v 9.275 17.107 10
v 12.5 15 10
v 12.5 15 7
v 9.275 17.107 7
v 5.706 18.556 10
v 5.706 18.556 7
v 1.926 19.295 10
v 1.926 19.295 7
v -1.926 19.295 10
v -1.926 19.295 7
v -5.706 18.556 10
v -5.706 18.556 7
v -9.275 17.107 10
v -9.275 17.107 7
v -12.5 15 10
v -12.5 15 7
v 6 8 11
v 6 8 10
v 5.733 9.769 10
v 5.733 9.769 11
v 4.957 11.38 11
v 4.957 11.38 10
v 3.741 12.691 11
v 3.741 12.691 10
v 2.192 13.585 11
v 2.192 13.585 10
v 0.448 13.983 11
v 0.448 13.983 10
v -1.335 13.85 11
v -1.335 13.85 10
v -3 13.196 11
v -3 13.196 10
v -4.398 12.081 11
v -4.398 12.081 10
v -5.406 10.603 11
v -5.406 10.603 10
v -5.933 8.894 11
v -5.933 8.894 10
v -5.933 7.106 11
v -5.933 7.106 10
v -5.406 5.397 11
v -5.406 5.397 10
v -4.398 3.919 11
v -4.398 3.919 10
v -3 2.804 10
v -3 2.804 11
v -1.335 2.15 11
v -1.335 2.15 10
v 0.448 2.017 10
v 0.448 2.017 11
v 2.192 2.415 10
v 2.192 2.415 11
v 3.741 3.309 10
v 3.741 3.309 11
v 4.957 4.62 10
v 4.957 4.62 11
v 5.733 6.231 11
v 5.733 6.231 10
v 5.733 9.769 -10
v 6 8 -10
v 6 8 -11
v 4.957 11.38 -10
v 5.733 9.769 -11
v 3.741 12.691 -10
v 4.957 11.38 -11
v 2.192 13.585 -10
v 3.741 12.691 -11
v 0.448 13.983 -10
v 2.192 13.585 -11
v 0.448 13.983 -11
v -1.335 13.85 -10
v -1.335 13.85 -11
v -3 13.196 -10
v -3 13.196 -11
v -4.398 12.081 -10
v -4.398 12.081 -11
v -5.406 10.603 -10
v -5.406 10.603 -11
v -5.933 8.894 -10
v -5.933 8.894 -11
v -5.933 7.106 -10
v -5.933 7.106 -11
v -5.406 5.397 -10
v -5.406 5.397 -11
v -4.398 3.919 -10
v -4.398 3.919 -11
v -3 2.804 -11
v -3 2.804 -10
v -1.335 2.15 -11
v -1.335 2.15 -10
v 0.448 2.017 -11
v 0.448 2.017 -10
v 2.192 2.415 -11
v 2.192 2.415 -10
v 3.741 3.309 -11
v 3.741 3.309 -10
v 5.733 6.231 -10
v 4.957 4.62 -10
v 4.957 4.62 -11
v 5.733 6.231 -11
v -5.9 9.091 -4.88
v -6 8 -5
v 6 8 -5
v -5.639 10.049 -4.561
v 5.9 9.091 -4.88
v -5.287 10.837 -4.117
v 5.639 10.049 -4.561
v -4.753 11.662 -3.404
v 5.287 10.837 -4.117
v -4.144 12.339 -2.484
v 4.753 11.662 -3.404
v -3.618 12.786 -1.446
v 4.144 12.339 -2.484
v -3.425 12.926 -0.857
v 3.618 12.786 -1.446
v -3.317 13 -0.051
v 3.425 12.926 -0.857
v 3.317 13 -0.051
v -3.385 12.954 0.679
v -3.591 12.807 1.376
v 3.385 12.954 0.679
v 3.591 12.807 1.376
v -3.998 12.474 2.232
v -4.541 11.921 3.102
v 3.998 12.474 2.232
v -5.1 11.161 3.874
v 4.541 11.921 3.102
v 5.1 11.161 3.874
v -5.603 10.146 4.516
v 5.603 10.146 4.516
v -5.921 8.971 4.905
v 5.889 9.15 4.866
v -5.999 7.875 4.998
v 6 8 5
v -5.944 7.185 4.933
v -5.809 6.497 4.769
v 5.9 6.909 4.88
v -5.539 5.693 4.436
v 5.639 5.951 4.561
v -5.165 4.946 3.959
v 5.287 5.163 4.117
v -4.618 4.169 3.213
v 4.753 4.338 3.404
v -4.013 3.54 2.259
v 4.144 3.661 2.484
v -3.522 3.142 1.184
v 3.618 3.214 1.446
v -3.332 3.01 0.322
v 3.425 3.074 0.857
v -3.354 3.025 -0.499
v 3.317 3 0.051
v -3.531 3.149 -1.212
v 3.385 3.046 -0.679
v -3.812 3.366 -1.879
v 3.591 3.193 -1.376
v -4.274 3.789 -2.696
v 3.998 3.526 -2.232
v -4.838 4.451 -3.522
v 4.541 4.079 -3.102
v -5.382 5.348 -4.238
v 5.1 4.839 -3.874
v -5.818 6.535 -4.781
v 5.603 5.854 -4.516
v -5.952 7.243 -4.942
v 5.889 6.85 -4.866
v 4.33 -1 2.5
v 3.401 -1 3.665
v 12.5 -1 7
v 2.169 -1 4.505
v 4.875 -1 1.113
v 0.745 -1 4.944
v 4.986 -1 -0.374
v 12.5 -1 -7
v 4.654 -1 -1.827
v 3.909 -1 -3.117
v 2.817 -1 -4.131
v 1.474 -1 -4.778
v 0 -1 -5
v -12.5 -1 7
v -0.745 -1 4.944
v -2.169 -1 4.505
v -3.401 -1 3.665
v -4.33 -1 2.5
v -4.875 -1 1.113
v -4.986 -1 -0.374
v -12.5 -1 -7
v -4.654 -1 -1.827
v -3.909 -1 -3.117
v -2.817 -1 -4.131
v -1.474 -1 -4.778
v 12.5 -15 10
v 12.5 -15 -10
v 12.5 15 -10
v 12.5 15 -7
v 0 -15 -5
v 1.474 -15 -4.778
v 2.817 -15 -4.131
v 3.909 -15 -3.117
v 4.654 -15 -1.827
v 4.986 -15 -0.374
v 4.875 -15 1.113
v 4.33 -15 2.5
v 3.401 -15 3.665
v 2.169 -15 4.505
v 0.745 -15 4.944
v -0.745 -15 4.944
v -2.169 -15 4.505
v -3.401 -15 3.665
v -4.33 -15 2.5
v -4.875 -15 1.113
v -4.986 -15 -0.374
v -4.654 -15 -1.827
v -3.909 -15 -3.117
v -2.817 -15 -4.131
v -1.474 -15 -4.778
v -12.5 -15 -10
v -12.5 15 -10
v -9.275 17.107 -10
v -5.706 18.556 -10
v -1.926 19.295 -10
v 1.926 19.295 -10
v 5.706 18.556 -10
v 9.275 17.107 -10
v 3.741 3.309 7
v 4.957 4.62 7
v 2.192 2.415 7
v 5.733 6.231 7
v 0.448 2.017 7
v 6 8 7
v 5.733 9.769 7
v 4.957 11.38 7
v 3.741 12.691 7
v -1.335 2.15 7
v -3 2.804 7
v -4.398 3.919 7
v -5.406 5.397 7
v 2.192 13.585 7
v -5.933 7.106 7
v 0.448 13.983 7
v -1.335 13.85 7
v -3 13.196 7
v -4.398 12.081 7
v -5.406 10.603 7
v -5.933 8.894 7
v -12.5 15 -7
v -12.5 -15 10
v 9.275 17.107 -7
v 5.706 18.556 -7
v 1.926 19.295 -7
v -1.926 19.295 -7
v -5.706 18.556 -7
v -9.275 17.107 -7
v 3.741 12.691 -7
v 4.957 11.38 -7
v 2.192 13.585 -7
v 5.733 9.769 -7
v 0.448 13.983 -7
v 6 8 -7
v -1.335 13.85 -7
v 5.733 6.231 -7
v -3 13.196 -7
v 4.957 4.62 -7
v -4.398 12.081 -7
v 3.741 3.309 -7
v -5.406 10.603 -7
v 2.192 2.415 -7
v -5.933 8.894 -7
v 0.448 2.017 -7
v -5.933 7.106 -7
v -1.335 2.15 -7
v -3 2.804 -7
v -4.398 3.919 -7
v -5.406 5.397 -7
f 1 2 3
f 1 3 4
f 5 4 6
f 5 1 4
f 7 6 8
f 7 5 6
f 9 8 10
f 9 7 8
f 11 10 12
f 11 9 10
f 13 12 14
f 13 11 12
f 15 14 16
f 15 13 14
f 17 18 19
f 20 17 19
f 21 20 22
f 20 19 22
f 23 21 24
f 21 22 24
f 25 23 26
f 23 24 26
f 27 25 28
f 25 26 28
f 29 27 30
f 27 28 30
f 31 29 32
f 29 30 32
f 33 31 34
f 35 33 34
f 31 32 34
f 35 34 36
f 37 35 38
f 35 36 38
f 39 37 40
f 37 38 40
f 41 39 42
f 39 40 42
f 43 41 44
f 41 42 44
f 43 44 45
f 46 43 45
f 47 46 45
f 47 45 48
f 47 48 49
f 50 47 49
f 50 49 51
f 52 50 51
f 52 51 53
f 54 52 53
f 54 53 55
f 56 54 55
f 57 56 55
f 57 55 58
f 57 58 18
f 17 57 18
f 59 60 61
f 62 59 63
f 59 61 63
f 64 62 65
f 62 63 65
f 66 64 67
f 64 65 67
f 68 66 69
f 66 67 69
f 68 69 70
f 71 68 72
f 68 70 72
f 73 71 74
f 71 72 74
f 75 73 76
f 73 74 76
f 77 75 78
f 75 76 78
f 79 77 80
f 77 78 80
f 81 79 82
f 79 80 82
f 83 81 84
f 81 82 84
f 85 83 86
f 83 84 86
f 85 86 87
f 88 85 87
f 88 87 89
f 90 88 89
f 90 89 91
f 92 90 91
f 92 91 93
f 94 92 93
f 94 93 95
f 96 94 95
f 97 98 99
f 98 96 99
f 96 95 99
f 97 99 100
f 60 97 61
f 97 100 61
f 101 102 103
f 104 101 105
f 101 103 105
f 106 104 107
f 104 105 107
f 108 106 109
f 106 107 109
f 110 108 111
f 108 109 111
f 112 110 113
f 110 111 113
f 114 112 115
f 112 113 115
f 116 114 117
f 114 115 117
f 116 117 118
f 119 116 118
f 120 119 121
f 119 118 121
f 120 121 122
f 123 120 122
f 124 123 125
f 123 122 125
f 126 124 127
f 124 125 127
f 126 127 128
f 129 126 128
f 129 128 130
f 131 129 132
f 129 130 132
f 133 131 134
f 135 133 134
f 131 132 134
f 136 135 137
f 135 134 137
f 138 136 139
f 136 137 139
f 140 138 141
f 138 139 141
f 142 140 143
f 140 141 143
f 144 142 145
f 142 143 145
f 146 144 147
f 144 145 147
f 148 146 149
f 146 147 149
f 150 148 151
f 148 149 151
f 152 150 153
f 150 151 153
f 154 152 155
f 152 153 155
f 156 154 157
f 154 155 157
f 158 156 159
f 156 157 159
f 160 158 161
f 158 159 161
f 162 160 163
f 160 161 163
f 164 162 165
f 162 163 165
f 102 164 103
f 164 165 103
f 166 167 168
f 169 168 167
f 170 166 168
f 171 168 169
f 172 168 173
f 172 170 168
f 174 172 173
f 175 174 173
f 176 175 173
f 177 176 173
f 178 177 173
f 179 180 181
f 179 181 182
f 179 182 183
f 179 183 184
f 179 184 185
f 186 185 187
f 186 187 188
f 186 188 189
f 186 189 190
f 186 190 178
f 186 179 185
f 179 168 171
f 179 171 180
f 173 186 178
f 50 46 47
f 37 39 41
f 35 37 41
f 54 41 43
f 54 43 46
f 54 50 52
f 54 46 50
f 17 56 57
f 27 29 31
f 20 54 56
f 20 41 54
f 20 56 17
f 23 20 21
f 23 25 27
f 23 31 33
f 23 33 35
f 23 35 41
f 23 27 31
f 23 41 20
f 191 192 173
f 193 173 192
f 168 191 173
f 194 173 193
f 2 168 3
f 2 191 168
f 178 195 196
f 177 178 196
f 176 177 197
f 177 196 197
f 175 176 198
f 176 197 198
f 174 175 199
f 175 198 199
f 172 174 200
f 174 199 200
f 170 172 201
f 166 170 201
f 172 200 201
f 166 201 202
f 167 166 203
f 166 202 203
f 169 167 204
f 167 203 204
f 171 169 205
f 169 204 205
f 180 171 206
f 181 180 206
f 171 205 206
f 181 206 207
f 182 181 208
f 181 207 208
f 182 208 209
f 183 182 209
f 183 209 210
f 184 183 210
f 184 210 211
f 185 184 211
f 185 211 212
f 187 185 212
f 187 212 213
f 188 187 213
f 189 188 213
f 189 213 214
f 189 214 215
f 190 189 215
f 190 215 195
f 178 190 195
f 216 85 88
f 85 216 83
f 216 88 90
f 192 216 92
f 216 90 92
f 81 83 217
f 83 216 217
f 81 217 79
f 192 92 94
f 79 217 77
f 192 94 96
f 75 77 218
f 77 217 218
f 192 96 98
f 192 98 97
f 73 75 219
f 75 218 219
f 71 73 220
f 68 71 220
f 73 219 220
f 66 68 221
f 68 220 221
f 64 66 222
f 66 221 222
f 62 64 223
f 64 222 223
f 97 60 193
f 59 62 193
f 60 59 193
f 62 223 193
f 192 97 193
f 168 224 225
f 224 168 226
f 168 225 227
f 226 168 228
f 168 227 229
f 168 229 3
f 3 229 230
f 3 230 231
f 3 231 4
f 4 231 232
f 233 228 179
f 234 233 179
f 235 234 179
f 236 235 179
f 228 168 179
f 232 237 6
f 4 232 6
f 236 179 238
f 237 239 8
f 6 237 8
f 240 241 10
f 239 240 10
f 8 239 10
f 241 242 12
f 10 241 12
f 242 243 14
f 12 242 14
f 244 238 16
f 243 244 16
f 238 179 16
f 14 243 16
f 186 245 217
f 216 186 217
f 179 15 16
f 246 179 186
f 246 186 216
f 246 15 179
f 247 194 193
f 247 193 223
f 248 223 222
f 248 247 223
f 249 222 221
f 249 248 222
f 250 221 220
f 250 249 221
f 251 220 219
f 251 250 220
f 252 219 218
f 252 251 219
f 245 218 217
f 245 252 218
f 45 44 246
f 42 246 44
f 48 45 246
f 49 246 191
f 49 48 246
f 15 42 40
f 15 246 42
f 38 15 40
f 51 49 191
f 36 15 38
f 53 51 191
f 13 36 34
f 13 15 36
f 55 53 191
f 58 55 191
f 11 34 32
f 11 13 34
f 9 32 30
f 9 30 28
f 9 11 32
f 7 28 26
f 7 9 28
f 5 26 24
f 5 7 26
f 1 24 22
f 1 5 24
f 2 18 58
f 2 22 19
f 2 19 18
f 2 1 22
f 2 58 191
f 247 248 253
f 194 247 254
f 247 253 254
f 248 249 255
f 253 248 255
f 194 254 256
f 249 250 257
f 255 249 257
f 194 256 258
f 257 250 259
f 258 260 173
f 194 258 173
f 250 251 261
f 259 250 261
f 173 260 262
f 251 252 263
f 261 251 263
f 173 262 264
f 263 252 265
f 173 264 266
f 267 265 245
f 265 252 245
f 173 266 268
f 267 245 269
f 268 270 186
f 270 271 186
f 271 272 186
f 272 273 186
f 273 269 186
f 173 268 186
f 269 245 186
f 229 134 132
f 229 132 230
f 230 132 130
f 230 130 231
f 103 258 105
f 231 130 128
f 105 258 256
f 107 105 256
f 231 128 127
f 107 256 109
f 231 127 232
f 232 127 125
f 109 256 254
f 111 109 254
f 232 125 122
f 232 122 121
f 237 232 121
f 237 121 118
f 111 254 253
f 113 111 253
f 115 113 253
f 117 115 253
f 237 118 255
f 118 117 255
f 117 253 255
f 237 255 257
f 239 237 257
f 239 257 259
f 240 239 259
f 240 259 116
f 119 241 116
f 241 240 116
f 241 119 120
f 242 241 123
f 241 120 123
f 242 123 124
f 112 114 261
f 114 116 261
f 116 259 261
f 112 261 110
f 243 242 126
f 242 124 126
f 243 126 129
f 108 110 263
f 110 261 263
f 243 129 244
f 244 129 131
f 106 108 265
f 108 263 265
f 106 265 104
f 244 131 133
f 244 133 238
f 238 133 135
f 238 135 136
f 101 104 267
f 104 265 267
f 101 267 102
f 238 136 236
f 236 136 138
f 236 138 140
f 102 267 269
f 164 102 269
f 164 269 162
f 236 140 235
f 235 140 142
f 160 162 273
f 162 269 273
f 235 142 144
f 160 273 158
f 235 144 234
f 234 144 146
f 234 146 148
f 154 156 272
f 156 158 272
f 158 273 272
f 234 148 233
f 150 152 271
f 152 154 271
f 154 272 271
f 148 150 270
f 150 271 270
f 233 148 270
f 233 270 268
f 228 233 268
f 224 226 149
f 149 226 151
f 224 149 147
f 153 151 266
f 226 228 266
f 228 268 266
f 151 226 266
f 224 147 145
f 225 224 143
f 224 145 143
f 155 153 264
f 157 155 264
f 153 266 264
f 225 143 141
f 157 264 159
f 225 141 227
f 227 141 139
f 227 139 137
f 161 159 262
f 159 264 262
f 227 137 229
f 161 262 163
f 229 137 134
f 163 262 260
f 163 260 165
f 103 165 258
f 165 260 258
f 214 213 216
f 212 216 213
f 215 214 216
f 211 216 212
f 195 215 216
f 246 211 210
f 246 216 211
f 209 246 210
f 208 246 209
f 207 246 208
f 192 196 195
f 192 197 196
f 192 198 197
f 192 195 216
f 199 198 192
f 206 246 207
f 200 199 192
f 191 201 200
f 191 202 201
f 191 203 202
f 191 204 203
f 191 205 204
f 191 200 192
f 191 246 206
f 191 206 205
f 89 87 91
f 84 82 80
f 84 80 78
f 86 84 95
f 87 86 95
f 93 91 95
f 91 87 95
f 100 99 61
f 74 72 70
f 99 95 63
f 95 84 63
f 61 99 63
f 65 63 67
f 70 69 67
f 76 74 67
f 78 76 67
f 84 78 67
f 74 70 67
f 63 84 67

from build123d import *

# Parameters (mm, degrees)
SKETCH1_R                = 5
BOSS_EXTRUDE1_DEPTH      = 10
CUT_EXTRUDE1_DEPTH       = 34.179441681
CUT_EXTRUDE1_DEPTH_BACK  = 34.179441681
BOSS_EXTRUDE2_DEPTH      = 1
BOSS_EXTRUDE2_DEPTH_BACK = 21
SKETCH4_R                = 6
SKETCH5_R                = 5
CUT_EXTRUDE3_DEPTH       = 7.5
SKETCH6_R                = 5
CUT_EXTRUDE4_DEPTH       = 15


with BuildPart() as part:
    # Sketch1 → Boss-Extrude1 (new, symmetric)
    with BuildSketch(Plane.XY):
        with BuildLine():
            Line((-12.5, 15), (-12.5, -15))
            Line((-12.5, -15), (12.5, -15))
            Line((12.5, -15), (12.5, 15))
            ThreePointArc((12.5, 15), (0, 19.387505004), (-12.5, 15))
        make_face()
        with Locations((0, 8)):
            Circle(SKETCH1_R, mode=Mode.SUBTRACT)
    extrude(amount=BOSS_EXTRUDE1_DEPTH, both=True)

    # Sketch2 → Cut-Extrude1 (cut, two sides: drawn at the far end of the back side and taken through both)
    with BuildSketch(Plane(origin=(12.5, 0, 0), x_dir=(0, 0, -1), z_dir=(1, 0, 0)).offset(-CUT_EXTRUDE1_DEPTH_BACK)):
        Polygon((0, -1), (-7, -1), (-7, 28.013491334), (7, 28.013491334), (7, -1), align=None)
    extrude(amount=CUT_EXTRUDE1_DEPTH + CUT_EXTRUDE1_DEPTH_BACK, mode=Mode.SUBTRACT)

    # Sketch4 → Boss-Extrude2 (add, two sides: drawn at the far end of the back side and taken through both)
    with BuildSketch(Plane.XY.offset(10).offset(-BOSS_EXTRUDE2_DEPTH_BACK)):
        with Locations((0, 8)):
            Circle(SKETCH4_R)
    extrude(amount=BOSS_EXTRUDE2_DEPTH + BOSS_EXTRUDE2_DEPTH_BACK)

    # Sketch5 → Cut-Extrude3 (cut, symmetric)
    with BuildSketch(Plane(origin=(0, 0, 0), x_dir=(0, 0, -1), z_dir=(1, 0, 0))):
        with Locations((0, 8)):
            Circle(SKETCH5_R)
    extrude(amount=CUT_EXTRUDE3_DEPTH, both=True, mode=Mode.SUBTRACT)

    # Sketch6 → Cut-Extrude4 (cut)
    with BuildSketch(Plane.XZ.offset(15)):
        with Locations(Location((0, 0, 0), (0, 0, 270))):
            Circle(SKETCH6_R)
    extrude(amount=-CUT_EXTRUDE4_DEPTH, mode=Mode.SUBTRACT)


solid = part.part
